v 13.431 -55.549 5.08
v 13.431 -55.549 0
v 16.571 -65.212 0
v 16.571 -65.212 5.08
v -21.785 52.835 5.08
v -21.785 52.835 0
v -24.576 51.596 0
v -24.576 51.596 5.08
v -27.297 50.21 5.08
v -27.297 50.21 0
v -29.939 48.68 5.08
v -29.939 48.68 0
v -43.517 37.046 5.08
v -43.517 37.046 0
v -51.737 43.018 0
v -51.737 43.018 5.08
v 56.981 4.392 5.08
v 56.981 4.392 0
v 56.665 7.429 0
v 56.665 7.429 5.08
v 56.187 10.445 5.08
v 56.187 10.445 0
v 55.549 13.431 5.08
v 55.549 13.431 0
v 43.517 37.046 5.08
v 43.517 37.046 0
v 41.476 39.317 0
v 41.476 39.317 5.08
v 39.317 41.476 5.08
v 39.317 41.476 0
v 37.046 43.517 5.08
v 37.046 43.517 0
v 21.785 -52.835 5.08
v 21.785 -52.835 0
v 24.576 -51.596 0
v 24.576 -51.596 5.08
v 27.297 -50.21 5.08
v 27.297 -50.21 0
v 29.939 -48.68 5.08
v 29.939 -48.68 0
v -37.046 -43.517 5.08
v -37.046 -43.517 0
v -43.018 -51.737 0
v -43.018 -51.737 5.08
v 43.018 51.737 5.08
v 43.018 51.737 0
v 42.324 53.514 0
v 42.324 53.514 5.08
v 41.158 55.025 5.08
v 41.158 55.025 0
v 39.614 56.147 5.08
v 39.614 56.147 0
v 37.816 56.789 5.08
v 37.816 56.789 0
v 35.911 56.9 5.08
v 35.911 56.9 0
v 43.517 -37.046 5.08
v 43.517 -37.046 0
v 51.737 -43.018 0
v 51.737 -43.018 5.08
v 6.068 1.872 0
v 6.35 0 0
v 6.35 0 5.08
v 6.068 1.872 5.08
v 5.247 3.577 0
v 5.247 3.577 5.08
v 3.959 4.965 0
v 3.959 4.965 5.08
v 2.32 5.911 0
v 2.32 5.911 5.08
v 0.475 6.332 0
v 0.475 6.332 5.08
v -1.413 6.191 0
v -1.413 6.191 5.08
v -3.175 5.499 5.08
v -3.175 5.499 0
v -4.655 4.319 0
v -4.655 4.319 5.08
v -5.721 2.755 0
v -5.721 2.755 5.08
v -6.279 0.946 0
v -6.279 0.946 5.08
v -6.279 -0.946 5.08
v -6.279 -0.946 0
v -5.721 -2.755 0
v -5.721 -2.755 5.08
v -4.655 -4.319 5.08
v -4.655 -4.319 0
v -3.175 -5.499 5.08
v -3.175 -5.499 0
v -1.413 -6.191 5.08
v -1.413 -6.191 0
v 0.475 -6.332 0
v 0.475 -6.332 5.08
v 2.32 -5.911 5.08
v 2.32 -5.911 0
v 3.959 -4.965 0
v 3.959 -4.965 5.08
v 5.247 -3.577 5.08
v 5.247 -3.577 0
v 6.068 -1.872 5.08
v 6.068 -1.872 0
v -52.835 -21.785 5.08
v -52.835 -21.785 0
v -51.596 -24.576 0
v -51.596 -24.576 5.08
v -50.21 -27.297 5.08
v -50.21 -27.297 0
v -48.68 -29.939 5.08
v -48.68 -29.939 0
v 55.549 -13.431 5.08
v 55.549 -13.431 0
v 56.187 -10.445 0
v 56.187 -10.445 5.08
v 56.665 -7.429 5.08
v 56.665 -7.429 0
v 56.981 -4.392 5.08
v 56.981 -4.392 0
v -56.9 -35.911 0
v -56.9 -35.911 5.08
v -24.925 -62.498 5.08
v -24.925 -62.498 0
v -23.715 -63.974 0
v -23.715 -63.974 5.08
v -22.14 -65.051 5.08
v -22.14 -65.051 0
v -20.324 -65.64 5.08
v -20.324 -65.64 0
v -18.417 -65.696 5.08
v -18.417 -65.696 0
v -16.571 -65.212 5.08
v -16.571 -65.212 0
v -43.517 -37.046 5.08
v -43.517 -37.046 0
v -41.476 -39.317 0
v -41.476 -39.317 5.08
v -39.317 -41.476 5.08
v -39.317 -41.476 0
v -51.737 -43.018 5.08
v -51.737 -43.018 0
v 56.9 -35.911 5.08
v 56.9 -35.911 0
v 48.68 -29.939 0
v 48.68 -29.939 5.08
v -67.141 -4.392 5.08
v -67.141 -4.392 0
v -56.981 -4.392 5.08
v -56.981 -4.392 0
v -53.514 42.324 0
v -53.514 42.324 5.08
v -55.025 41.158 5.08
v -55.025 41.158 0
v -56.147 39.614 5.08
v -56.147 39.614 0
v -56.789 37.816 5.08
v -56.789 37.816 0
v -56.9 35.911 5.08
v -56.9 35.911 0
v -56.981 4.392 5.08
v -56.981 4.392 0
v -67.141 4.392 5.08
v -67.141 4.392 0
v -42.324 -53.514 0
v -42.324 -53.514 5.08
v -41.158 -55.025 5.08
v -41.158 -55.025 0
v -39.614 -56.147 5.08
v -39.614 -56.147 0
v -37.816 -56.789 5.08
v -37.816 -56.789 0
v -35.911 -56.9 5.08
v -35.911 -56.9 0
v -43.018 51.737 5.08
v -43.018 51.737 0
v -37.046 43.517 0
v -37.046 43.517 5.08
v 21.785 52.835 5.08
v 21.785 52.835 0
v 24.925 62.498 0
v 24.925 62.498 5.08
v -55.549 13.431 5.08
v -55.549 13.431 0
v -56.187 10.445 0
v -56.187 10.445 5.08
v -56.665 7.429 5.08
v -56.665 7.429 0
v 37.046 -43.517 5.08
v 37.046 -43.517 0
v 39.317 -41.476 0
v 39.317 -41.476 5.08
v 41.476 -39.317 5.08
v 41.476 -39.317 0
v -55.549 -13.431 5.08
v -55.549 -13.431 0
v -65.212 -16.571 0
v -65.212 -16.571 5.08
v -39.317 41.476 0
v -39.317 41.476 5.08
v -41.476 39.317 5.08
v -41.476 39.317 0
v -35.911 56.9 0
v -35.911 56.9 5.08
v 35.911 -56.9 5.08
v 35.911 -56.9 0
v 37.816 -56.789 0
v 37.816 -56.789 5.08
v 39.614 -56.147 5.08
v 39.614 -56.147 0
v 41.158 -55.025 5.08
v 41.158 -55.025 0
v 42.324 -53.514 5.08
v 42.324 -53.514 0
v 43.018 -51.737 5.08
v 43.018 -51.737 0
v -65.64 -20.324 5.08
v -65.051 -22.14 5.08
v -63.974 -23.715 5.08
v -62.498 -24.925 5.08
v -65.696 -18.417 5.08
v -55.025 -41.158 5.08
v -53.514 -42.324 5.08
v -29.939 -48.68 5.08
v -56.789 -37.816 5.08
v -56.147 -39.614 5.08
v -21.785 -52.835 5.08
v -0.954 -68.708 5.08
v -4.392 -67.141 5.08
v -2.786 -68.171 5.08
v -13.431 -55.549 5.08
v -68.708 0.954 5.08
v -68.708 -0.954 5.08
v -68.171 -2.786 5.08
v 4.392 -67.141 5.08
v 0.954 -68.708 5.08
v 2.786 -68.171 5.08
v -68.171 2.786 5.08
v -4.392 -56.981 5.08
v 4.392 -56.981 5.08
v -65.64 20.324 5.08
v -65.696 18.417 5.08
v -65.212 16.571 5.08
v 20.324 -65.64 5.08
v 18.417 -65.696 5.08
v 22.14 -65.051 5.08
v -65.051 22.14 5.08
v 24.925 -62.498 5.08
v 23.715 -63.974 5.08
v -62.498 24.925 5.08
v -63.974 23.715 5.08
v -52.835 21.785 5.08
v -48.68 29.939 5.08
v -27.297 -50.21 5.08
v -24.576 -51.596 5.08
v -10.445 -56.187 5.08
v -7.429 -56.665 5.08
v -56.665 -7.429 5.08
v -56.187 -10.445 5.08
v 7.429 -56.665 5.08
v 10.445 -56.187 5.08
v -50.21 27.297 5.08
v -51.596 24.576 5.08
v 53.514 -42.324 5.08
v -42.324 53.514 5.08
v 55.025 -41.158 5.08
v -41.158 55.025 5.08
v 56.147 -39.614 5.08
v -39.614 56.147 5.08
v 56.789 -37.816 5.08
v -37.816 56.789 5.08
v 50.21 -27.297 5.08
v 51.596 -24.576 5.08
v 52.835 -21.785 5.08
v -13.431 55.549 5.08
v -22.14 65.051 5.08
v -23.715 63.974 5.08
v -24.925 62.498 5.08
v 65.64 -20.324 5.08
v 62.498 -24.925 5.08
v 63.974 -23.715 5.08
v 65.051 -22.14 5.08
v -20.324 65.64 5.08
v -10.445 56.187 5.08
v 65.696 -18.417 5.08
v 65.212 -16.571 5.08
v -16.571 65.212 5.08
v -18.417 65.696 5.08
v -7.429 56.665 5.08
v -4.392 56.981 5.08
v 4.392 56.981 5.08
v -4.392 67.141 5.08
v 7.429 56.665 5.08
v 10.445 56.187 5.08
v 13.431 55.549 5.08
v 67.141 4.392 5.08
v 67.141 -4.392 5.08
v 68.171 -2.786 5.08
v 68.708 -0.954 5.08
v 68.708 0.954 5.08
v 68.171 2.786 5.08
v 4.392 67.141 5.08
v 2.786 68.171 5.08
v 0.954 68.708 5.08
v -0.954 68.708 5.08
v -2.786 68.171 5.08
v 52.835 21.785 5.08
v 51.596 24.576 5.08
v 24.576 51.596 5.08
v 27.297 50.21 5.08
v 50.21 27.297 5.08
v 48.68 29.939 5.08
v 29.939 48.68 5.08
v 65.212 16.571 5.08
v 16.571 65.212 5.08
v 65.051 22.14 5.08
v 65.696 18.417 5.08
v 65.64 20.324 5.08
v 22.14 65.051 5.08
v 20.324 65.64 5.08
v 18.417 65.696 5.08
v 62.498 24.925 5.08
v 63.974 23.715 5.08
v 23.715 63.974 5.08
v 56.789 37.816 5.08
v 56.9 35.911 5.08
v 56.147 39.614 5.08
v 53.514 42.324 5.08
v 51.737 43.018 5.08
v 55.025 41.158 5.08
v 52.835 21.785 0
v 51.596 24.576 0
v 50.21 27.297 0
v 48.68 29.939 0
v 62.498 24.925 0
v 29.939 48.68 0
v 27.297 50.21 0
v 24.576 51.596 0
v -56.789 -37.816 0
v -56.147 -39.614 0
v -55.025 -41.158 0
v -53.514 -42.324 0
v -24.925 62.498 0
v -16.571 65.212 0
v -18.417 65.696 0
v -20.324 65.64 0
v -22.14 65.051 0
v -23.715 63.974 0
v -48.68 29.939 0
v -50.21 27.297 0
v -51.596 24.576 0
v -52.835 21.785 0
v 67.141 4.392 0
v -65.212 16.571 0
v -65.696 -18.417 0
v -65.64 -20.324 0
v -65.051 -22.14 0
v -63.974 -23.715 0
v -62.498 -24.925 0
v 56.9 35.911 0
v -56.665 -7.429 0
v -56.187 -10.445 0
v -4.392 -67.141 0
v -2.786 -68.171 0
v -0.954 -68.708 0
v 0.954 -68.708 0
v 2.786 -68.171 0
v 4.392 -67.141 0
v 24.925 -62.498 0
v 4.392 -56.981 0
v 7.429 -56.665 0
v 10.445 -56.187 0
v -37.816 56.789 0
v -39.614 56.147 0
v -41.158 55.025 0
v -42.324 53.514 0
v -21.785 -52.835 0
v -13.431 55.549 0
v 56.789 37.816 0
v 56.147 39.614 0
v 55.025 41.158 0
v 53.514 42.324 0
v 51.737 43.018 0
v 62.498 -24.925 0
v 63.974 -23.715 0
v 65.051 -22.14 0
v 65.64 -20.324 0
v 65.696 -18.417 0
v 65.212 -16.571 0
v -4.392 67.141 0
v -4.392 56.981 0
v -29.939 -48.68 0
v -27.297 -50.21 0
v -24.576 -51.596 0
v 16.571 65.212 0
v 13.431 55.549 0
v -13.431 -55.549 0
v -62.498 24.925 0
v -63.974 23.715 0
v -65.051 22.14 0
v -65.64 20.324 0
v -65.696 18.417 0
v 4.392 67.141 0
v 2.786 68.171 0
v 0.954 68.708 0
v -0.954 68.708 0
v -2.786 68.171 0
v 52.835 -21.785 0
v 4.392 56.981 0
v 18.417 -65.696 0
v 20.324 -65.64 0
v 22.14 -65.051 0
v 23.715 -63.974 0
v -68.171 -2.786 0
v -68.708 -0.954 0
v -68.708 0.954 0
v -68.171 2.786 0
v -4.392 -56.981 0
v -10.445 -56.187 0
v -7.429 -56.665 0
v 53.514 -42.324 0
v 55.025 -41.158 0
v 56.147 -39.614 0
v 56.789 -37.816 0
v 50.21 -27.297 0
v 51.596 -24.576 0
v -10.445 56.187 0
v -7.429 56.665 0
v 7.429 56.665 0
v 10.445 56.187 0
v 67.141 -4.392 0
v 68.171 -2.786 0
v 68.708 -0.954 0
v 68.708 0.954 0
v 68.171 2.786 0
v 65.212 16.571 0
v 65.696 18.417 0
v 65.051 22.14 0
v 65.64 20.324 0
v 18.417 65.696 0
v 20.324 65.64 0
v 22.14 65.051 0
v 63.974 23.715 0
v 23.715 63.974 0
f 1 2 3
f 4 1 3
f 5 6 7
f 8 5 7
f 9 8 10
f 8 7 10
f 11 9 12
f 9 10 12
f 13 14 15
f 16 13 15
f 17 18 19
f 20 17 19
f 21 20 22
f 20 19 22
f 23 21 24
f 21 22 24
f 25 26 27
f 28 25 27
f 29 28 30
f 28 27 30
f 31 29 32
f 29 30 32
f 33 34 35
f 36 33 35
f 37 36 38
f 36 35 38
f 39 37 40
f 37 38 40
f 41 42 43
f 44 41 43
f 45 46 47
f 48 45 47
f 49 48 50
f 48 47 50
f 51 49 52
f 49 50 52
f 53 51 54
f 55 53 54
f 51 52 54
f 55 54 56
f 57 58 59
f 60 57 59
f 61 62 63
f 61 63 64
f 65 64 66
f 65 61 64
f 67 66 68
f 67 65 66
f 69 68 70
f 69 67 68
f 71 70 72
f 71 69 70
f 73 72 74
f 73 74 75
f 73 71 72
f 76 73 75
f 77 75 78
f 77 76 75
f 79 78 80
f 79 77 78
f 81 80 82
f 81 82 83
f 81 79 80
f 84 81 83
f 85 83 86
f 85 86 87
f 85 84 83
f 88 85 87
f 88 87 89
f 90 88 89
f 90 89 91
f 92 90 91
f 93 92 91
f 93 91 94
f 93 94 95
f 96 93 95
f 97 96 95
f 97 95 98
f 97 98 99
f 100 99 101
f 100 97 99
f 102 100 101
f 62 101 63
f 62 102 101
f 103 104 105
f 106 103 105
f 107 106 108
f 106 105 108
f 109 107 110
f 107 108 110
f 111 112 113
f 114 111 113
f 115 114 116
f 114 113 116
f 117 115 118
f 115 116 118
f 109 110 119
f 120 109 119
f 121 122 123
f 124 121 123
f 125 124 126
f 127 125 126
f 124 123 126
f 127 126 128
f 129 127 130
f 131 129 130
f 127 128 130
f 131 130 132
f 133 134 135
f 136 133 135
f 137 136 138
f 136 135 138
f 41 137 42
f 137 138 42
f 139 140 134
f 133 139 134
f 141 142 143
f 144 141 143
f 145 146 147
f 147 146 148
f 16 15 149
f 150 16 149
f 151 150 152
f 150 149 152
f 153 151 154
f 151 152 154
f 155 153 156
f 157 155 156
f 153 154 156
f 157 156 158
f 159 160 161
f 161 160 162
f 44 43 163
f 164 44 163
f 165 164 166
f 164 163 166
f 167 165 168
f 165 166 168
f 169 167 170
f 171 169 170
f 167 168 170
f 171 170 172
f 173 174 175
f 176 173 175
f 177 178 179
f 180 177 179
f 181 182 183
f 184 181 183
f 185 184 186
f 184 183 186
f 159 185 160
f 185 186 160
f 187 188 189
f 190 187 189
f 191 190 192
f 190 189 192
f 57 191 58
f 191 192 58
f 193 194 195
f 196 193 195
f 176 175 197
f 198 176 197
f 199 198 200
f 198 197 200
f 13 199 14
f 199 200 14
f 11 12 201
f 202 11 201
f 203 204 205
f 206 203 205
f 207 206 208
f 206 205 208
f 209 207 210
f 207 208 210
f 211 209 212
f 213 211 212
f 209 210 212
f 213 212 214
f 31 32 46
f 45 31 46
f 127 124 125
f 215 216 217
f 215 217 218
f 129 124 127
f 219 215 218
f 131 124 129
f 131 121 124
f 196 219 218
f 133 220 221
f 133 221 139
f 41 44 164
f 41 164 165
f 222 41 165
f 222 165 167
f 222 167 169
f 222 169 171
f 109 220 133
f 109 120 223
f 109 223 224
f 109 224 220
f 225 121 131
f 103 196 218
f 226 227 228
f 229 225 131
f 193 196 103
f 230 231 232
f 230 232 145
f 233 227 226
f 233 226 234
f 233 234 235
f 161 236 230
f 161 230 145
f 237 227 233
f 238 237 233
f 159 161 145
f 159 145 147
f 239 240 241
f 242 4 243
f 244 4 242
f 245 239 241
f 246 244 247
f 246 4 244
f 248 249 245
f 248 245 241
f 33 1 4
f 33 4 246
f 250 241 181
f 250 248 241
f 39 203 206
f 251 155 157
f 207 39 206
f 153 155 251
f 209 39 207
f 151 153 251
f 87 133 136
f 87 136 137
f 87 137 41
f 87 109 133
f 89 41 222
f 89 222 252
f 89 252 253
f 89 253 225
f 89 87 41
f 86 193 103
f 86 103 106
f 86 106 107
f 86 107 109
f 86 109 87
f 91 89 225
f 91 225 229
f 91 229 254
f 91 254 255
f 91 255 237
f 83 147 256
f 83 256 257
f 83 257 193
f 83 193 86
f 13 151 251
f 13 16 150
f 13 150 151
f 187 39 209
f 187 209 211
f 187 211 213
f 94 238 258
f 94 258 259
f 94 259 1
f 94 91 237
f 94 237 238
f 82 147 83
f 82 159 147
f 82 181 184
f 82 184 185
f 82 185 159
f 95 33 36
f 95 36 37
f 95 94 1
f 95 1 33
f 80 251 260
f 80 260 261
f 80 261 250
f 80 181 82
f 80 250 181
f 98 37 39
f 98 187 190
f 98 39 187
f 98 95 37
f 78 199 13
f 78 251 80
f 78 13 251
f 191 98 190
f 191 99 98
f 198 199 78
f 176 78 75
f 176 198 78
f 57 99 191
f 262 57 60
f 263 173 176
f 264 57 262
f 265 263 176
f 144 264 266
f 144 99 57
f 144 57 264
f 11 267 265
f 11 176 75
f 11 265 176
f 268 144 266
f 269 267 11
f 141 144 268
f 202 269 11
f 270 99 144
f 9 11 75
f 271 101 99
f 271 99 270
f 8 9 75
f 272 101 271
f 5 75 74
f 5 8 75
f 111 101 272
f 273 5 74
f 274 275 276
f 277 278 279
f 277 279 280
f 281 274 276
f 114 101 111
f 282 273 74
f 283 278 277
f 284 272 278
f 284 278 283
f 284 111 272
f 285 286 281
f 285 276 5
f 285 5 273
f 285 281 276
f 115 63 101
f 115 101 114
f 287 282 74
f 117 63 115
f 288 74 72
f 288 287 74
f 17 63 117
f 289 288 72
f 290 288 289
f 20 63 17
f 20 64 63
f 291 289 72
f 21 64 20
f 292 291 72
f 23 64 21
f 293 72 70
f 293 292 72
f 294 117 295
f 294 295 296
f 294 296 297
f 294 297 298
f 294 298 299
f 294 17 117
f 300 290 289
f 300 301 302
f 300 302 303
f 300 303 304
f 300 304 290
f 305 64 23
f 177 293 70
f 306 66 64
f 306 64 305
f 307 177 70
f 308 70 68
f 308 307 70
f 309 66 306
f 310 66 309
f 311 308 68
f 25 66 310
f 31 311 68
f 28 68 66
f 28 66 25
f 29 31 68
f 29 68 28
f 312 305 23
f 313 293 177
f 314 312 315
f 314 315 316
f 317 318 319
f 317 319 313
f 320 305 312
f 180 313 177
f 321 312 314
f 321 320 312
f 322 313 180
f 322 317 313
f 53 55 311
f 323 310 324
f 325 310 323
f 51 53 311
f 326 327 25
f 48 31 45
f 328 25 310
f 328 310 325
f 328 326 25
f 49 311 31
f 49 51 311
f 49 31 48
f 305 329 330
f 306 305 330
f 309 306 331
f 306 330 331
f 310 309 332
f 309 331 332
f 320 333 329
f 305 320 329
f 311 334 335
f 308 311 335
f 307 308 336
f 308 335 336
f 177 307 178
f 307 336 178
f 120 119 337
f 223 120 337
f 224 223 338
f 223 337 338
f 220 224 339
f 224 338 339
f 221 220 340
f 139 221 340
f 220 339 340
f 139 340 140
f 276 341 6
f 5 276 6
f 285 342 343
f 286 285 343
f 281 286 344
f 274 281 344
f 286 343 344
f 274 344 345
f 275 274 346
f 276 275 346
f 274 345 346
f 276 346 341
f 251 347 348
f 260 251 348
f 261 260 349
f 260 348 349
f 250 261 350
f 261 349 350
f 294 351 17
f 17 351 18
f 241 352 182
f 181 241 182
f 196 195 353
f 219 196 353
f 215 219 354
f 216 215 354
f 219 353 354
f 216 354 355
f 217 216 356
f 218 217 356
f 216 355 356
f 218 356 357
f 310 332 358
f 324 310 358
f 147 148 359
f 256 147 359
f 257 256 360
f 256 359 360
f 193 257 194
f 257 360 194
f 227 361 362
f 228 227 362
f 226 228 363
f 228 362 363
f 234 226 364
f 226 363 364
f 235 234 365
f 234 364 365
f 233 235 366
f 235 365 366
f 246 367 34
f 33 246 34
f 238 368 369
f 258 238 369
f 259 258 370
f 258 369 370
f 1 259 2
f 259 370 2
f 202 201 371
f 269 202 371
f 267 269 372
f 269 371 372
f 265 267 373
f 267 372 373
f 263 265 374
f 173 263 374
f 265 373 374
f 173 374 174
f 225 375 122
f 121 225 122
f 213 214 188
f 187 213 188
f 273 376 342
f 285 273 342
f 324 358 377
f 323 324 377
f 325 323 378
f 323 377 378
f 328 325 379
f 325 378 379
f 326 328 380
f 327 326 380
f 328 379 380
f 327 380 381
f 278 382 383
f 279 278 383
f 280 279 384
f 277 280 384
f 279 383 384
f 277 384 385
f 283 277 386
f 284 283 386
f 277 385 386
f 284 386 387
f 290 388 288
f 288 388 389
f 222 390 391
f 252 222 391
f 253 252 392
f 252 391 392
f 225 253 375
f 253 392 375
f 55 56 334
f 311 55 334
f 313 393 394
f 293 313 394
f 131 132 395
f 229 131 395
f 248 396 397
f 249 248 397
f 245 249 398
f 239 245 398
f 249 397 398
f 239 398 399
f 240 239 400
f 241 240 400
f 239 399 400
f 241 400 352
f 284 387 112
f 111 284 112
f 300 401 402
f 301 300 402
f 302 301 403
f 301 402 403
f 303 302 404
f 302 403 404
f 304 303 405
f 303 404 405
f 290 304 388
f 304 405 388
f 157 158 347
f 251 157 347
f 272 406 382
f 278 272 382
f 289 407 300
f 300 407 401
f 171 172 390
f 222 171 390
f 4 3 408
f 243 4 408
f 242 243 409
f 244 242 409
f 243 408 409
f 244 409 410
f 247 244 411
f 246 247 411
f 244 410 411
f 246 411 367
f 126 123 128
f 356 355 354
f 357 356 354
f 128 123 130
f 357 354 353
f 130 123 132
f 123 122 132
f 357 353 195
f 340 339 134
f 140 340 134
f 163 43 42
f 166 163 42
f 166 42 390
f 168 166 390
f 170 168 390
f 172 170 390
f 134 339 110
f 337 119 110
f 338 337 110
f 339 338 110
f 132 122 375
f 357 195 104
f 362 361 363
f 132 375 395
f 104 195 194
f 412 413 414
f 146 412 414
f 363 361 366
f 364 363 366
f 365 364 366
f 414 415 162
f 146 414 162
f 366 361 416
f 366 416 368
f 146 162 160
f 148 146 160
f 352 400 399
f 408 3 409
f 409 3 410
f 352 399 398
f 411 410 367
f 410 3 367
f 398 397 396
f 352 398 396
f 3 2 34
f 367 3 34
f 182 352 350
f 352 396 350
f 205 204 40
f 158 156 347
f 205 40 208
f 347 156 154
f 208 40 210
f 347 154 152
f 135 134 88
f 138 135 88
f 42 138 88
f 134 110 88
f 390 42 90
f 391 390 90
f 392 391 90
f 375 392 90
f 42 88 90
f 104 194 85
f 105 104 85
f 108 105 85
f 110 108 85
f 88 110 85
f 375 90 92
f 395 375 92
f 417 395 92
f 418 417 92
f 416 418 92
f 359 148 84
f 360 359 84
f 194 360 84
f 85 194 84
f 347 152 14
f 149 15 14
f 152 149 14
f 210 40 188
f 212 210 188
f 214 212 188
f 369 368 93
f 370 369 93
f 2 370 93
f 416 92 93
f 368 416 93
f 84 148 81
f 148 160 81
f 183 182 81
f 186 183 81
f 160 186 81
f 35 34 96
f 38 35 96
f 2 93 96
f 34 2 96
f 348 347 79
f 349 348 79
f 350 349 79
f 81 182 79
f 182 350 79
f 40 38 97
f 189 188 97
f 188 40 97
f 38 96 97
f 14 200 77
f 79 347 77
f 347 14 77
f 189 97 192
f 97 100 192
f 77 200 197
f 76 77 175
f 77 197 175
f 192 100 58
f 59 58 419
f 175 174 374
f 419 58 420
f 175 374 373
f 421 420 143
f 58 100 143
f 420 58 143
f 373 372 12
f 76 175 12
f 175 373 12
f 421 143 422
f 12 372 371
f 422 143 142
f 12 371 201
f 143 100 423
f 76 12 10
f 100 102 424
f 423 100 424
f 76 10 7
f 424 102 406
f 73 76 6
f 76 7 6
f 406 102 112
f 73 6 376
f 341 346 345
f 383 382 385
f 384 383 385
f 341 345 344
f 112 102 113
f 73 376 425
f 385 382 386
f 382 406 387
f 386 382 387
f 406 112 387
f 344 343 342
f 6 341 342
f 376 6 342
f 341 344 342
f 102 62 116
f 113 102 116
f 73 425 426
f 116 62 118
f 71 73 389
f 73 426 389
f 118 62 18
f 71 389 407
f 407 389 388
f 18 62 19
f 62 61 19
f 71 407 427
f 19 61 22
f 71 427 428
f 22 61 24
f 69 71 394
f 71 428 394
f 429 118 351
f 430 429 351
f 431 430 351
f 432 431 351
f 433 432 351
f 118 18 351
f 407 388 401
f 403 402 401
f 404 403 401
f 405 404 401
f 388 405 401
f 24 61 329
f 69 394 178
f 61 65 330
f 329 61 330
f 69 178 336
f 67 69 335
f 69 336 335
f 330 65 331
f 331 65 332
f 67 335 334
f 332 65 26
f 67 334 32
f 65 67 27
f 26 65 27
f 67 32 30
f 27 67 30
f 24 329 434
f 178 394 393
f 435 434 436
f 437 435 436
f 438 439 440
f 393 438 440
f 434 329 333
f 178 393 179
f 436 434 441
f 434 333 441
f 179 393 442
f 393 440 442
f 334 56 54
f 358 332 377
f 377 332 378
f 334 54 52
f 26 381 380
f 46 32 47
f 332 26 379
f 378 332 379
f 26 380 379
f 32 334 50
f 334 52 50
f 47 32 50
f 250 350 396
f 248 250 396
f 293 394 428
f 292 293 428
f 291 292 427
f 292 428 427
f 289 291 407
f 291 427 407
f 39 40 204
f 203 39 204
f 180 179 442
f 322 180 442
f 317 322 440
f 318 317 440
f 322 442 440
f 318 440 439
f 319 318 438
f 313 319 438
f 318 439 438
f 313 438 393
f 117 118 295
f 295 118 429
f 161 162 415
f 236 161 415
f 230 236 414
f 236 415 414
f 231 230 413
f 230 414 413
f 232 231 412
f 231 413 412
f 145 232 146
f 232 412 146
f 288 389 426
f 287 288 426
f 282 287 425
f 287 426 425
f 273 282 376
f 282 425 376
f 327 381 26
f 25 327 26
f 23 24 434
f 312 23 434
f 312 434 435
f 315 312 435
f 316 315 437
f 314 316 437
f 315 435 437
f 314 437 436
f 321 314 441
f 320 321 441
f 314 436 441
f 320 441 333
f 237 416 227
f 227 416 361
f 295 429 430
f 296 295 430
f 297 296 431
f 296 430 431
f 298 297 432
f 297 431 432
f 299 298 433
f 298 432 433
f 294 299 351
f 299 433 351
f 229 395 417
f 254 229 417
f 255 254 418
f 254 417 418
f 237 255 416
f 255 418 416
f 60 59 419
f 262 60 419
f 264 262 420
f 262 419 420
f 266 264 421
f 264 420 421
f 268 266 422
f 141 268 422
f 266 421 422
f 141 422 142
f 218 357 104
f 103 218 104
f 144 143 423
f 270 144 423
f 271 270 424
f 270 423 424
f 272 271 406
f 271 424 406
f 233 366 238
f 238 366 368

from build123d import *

# Parameters (mm, degrees)
F0_R     = 6.35
F1_DEPTH = 5.08


with BuildPart() as f1:
    # F0 (on Top) → F1 (new body)
    with BuildSketch(Plane.XY):
        with BuildLine():
            Line((-4.392071, 67.140981), (-4.392071, 56.980981))
            ThreePointArc((-4.392071, 56.980981), (-8.94023, 56.446389), (-13.430984, 55.549358))
            Line((-13.430984, 55.549358), (-16.570597, 65.212092))
            ThreePointArc((-16.570597, 65.212092), (-21.253073, 65.410232), (-24.924812, 62.497643))
            Line((-24.924812, 62.497643), (-21.785199, 52.834909))
            ThreePointArc((-21.785199, 52.834909), (-25.945557, 50.921023), (-29.939321, 48.680176))
            Line((-29.939321, 48.680176), (-35.911219, 56.899789))
            ThreePointArc((-35.911219, 56.899789), (-40.425746, 55.641266), (-43.017738, 51.7366))
            Line((-43.017738, 51.7366), (-37.04584, 43.516988))
            ThreePointArc((-37.04584, 43.516988), (-40.411153, 40.411153), (-43.516988, 37.04584))
            Line((-43.516988, 37.04584), (-51.7366, 43.017738))
            ThreePointArc((-51.7366, 43.017738), (-55.641266, 40.425746), (-56.899789, 35.911219))
            Line((-56.899789, 35.911219), (-48.680176, 29.939321))
            ThreePointArc((-48.680176, 29.939321), (-50.921023, 25.945557), (-52.834909, 21.785199))
            Line((-52.834909, 21.785199), (-62.497643, 24.924812))
            ThreePointArc((-62.497643, 24.924812), (-65.410232, 21.253073), (-65.212092, 16.570597))
            Line((-65.212092, 16.570597), (-55.549358, 13.430984))
            ThreePointArc((-55.549358, 13.430984), (-56.446389, 8.94023), (-56.980981, 4.392071))
            Line((-56.980981, 4.392071), (-67.140981, 4.392071))
            ThreePointArc((-67.140981, 4.392071), (-68.776388, 0), (-67.140981, -4.392071))
            Line((-67.140981, -4.392071), (-56.980981, -4.392071))
            ThreePointArc((-56.980981, -4.392071), (-56.446389, -8.94023), (-55.549358, -13.430984))
            Line((-55.549358, -13.430984), (-65.212092, -16.570597))
            ThreePointArc((-65.212092, -16.570597), (-65.410232, -21.253073), (-62.497643, -24.924812))
            Line((-62.497643, -24.924812), (-52.834909, -21.785199))
            ThreePointArc((-52.834909, -21.785199), (-50.921023, -25.945557), (-48.680176, -29.939321))
            Line((-48.680176, -29.939321), (-56.899789, -35.911219))
            ThreePointArc((-56.899789, -35.911219), (-55.641266, -40.425746), (-51.7366, -43.017738))
            Line((-51.7366, -43.017738), (-43.516988, -37.04584))
            ThreePointArc((-43.516988, -37.04584), (-40.411153, -40.411153), (-37.04584, -43.516988))
            Line((-37.04584, -43.516988), (-43.017738, -51.7366))
            ThreePointArc((-43.017738, -51.7366), (-40.425746, -55.641266), (-35.911219, -56.899789))
            Line((-35.911219, -56.899789), (-29.939321, -48.680176))
            ThreePointArc((-29.939321, -48.680176), (-25.945557, -50.921023), (-21.785199, -52.834909))
            Line((-21.785199, -52.834909), (-24.924812, -62.497643))
            ThreePointArc((-24.924812, -62.497643), (-21.253073, -65.410232), (-16.570597, -65.212092))
            Line((-16.570597, -65.212092), (-13.430984, -55.549358))
            ThreePointArc((-13.430984, -55.549358), (-8.94023, -56.446389), (-4.392071, -56.980981))
            Line((-4.392071, -56.980981), (-4.392071, -67.140981))
            ThreePointArc((-4.392071, -67.140981), (0, -68.776388), (4.392071, -67.140981))
            Line((4.392071, -67.140981), (4.392071, -56.980981))
            ThreePointArc((4.392071, -56.980981), (8.94023, -56.446389), (13.430984, -55.549358))
            Line((13.430984, -55.549358), (16.570597, -65.212092))
            ThreePointArc((16.570597, -65.212092), (21.253073, -65.410232), (24.924812, -62.497643))
            Line((24.924812, -62.497643), (21.785199, -52.834909))
            ThreePointArc((21.785199, -52.834909), (25.945557, -50.921023), (29.939321, -48.680176))
            Line((29.939321, -48.680176), (35.911219, -56.899789))
            ThreePointArc((35.911219, -56.899789), (40.425746, -55.641266), (43.017738, -51.7366))
            Line((43.017738, -51.7366), (37.04584, -43.516988))
            ThreePointArc((37.04584, -43.516988), (40.411153, -40.411153), (43.516988, -37.04584))
            Line((43.516988, -37.04584), (51.7366, -43.017738))
            ThreePointArc((51.7366, -43.017738), (55.641266, -40.425746), (56.899789, -35.911219))
            Line((56.899789, -35.911219), (48.680176, -29.939321))
            ThreePointArc((48.680176, -29.939321), (50.921023, -25.945557), (52.834909, -21.785199))
            Line((52.834909, -21.785199), (62.497643, -24.924812))
            ThreePointArc((62.497643, -24.924812), (65.410232, -21.253073), (65.212092, -16.570597))
            Line((65.212092, -16.570597), (55.549358, -13.430984))
            ThreePointArc((55.549358, -13.430984), (56.446389, -8.94023), (56.980981, -4.392071))
            Line((56.980981, -4.392071), (67.140981, -4.392071))
            ThreePointArc((67.140981, -4.392071), (68.776388, 0), (67.140981, 4.392071))
            Line((67.140981, 4.392071), (56.980981, 4.392071))
            ThreePointArc((56.980981, 4.392071), (56.446389, 8.94023), (55.549358, 13.430984))
            Line((55.549358, 13.430984), (65.212092, 16.570597))
            ThreePointArc((65.212092, 16.570597), (65.410232, 21.253073), (62.497643, 24.924812))
            Line((62.497643, 24.924812), (52.834909, 21.785199))
            ThreePointArc((52.834909, 21.785199), (50.921023, 25.945557), (48.680176, 29.939321))
            Line((48.680176, 29.939321), (56.899789, 35.911219))
            ThreePointArc((56.899789, 35.911219), (55.641266, 40.425746), (51.7366, 43.017738))
            Line((51.7366, 43.017738), (43.516988, 37.04584))
            ThreePointArc((43.516988, 37.04584), (40.411153, 40.411153), (37.04584, 43.516988))
            Line((37.04584, 43.516988), (43.017738, 51.7366))
            ThreePointArc((43.017738, 51.7366), (40.425746, 55.641266), (35.911219, 56.899789))
            Line((35.911219, 56.899789), (29.939321, 48.680176))
            ThreePointArc((29.939321, 48.680176), (25.945557, 50.921023), (21.785199, 52.834909))
            Line((21.785199, 52.834909), (24.924812, 62.497643))
            ThreePointArc((24.924812, 62.497643), (21.253073, 65.410232), (16.570597, 65.212092))
            Line((16.570597, 65.212092), (13.430984, 55.549358))
            ThreePointArc((13.430984, 55.549358), (8.94023, 56.446389), (4.392071, 56.980981))
            Line((4.392071, 56.980981), (4.392071, 67.140981))
            ThreePointArc((4.392071, 67.140981), (0, 68.776388), (-4.392071, 67.140981))
        make_face()
        Circle(F0_R, mode=Mode.SUBTRACT)
    extrude(amount=F1_DEPTH)


solid = f1.part
